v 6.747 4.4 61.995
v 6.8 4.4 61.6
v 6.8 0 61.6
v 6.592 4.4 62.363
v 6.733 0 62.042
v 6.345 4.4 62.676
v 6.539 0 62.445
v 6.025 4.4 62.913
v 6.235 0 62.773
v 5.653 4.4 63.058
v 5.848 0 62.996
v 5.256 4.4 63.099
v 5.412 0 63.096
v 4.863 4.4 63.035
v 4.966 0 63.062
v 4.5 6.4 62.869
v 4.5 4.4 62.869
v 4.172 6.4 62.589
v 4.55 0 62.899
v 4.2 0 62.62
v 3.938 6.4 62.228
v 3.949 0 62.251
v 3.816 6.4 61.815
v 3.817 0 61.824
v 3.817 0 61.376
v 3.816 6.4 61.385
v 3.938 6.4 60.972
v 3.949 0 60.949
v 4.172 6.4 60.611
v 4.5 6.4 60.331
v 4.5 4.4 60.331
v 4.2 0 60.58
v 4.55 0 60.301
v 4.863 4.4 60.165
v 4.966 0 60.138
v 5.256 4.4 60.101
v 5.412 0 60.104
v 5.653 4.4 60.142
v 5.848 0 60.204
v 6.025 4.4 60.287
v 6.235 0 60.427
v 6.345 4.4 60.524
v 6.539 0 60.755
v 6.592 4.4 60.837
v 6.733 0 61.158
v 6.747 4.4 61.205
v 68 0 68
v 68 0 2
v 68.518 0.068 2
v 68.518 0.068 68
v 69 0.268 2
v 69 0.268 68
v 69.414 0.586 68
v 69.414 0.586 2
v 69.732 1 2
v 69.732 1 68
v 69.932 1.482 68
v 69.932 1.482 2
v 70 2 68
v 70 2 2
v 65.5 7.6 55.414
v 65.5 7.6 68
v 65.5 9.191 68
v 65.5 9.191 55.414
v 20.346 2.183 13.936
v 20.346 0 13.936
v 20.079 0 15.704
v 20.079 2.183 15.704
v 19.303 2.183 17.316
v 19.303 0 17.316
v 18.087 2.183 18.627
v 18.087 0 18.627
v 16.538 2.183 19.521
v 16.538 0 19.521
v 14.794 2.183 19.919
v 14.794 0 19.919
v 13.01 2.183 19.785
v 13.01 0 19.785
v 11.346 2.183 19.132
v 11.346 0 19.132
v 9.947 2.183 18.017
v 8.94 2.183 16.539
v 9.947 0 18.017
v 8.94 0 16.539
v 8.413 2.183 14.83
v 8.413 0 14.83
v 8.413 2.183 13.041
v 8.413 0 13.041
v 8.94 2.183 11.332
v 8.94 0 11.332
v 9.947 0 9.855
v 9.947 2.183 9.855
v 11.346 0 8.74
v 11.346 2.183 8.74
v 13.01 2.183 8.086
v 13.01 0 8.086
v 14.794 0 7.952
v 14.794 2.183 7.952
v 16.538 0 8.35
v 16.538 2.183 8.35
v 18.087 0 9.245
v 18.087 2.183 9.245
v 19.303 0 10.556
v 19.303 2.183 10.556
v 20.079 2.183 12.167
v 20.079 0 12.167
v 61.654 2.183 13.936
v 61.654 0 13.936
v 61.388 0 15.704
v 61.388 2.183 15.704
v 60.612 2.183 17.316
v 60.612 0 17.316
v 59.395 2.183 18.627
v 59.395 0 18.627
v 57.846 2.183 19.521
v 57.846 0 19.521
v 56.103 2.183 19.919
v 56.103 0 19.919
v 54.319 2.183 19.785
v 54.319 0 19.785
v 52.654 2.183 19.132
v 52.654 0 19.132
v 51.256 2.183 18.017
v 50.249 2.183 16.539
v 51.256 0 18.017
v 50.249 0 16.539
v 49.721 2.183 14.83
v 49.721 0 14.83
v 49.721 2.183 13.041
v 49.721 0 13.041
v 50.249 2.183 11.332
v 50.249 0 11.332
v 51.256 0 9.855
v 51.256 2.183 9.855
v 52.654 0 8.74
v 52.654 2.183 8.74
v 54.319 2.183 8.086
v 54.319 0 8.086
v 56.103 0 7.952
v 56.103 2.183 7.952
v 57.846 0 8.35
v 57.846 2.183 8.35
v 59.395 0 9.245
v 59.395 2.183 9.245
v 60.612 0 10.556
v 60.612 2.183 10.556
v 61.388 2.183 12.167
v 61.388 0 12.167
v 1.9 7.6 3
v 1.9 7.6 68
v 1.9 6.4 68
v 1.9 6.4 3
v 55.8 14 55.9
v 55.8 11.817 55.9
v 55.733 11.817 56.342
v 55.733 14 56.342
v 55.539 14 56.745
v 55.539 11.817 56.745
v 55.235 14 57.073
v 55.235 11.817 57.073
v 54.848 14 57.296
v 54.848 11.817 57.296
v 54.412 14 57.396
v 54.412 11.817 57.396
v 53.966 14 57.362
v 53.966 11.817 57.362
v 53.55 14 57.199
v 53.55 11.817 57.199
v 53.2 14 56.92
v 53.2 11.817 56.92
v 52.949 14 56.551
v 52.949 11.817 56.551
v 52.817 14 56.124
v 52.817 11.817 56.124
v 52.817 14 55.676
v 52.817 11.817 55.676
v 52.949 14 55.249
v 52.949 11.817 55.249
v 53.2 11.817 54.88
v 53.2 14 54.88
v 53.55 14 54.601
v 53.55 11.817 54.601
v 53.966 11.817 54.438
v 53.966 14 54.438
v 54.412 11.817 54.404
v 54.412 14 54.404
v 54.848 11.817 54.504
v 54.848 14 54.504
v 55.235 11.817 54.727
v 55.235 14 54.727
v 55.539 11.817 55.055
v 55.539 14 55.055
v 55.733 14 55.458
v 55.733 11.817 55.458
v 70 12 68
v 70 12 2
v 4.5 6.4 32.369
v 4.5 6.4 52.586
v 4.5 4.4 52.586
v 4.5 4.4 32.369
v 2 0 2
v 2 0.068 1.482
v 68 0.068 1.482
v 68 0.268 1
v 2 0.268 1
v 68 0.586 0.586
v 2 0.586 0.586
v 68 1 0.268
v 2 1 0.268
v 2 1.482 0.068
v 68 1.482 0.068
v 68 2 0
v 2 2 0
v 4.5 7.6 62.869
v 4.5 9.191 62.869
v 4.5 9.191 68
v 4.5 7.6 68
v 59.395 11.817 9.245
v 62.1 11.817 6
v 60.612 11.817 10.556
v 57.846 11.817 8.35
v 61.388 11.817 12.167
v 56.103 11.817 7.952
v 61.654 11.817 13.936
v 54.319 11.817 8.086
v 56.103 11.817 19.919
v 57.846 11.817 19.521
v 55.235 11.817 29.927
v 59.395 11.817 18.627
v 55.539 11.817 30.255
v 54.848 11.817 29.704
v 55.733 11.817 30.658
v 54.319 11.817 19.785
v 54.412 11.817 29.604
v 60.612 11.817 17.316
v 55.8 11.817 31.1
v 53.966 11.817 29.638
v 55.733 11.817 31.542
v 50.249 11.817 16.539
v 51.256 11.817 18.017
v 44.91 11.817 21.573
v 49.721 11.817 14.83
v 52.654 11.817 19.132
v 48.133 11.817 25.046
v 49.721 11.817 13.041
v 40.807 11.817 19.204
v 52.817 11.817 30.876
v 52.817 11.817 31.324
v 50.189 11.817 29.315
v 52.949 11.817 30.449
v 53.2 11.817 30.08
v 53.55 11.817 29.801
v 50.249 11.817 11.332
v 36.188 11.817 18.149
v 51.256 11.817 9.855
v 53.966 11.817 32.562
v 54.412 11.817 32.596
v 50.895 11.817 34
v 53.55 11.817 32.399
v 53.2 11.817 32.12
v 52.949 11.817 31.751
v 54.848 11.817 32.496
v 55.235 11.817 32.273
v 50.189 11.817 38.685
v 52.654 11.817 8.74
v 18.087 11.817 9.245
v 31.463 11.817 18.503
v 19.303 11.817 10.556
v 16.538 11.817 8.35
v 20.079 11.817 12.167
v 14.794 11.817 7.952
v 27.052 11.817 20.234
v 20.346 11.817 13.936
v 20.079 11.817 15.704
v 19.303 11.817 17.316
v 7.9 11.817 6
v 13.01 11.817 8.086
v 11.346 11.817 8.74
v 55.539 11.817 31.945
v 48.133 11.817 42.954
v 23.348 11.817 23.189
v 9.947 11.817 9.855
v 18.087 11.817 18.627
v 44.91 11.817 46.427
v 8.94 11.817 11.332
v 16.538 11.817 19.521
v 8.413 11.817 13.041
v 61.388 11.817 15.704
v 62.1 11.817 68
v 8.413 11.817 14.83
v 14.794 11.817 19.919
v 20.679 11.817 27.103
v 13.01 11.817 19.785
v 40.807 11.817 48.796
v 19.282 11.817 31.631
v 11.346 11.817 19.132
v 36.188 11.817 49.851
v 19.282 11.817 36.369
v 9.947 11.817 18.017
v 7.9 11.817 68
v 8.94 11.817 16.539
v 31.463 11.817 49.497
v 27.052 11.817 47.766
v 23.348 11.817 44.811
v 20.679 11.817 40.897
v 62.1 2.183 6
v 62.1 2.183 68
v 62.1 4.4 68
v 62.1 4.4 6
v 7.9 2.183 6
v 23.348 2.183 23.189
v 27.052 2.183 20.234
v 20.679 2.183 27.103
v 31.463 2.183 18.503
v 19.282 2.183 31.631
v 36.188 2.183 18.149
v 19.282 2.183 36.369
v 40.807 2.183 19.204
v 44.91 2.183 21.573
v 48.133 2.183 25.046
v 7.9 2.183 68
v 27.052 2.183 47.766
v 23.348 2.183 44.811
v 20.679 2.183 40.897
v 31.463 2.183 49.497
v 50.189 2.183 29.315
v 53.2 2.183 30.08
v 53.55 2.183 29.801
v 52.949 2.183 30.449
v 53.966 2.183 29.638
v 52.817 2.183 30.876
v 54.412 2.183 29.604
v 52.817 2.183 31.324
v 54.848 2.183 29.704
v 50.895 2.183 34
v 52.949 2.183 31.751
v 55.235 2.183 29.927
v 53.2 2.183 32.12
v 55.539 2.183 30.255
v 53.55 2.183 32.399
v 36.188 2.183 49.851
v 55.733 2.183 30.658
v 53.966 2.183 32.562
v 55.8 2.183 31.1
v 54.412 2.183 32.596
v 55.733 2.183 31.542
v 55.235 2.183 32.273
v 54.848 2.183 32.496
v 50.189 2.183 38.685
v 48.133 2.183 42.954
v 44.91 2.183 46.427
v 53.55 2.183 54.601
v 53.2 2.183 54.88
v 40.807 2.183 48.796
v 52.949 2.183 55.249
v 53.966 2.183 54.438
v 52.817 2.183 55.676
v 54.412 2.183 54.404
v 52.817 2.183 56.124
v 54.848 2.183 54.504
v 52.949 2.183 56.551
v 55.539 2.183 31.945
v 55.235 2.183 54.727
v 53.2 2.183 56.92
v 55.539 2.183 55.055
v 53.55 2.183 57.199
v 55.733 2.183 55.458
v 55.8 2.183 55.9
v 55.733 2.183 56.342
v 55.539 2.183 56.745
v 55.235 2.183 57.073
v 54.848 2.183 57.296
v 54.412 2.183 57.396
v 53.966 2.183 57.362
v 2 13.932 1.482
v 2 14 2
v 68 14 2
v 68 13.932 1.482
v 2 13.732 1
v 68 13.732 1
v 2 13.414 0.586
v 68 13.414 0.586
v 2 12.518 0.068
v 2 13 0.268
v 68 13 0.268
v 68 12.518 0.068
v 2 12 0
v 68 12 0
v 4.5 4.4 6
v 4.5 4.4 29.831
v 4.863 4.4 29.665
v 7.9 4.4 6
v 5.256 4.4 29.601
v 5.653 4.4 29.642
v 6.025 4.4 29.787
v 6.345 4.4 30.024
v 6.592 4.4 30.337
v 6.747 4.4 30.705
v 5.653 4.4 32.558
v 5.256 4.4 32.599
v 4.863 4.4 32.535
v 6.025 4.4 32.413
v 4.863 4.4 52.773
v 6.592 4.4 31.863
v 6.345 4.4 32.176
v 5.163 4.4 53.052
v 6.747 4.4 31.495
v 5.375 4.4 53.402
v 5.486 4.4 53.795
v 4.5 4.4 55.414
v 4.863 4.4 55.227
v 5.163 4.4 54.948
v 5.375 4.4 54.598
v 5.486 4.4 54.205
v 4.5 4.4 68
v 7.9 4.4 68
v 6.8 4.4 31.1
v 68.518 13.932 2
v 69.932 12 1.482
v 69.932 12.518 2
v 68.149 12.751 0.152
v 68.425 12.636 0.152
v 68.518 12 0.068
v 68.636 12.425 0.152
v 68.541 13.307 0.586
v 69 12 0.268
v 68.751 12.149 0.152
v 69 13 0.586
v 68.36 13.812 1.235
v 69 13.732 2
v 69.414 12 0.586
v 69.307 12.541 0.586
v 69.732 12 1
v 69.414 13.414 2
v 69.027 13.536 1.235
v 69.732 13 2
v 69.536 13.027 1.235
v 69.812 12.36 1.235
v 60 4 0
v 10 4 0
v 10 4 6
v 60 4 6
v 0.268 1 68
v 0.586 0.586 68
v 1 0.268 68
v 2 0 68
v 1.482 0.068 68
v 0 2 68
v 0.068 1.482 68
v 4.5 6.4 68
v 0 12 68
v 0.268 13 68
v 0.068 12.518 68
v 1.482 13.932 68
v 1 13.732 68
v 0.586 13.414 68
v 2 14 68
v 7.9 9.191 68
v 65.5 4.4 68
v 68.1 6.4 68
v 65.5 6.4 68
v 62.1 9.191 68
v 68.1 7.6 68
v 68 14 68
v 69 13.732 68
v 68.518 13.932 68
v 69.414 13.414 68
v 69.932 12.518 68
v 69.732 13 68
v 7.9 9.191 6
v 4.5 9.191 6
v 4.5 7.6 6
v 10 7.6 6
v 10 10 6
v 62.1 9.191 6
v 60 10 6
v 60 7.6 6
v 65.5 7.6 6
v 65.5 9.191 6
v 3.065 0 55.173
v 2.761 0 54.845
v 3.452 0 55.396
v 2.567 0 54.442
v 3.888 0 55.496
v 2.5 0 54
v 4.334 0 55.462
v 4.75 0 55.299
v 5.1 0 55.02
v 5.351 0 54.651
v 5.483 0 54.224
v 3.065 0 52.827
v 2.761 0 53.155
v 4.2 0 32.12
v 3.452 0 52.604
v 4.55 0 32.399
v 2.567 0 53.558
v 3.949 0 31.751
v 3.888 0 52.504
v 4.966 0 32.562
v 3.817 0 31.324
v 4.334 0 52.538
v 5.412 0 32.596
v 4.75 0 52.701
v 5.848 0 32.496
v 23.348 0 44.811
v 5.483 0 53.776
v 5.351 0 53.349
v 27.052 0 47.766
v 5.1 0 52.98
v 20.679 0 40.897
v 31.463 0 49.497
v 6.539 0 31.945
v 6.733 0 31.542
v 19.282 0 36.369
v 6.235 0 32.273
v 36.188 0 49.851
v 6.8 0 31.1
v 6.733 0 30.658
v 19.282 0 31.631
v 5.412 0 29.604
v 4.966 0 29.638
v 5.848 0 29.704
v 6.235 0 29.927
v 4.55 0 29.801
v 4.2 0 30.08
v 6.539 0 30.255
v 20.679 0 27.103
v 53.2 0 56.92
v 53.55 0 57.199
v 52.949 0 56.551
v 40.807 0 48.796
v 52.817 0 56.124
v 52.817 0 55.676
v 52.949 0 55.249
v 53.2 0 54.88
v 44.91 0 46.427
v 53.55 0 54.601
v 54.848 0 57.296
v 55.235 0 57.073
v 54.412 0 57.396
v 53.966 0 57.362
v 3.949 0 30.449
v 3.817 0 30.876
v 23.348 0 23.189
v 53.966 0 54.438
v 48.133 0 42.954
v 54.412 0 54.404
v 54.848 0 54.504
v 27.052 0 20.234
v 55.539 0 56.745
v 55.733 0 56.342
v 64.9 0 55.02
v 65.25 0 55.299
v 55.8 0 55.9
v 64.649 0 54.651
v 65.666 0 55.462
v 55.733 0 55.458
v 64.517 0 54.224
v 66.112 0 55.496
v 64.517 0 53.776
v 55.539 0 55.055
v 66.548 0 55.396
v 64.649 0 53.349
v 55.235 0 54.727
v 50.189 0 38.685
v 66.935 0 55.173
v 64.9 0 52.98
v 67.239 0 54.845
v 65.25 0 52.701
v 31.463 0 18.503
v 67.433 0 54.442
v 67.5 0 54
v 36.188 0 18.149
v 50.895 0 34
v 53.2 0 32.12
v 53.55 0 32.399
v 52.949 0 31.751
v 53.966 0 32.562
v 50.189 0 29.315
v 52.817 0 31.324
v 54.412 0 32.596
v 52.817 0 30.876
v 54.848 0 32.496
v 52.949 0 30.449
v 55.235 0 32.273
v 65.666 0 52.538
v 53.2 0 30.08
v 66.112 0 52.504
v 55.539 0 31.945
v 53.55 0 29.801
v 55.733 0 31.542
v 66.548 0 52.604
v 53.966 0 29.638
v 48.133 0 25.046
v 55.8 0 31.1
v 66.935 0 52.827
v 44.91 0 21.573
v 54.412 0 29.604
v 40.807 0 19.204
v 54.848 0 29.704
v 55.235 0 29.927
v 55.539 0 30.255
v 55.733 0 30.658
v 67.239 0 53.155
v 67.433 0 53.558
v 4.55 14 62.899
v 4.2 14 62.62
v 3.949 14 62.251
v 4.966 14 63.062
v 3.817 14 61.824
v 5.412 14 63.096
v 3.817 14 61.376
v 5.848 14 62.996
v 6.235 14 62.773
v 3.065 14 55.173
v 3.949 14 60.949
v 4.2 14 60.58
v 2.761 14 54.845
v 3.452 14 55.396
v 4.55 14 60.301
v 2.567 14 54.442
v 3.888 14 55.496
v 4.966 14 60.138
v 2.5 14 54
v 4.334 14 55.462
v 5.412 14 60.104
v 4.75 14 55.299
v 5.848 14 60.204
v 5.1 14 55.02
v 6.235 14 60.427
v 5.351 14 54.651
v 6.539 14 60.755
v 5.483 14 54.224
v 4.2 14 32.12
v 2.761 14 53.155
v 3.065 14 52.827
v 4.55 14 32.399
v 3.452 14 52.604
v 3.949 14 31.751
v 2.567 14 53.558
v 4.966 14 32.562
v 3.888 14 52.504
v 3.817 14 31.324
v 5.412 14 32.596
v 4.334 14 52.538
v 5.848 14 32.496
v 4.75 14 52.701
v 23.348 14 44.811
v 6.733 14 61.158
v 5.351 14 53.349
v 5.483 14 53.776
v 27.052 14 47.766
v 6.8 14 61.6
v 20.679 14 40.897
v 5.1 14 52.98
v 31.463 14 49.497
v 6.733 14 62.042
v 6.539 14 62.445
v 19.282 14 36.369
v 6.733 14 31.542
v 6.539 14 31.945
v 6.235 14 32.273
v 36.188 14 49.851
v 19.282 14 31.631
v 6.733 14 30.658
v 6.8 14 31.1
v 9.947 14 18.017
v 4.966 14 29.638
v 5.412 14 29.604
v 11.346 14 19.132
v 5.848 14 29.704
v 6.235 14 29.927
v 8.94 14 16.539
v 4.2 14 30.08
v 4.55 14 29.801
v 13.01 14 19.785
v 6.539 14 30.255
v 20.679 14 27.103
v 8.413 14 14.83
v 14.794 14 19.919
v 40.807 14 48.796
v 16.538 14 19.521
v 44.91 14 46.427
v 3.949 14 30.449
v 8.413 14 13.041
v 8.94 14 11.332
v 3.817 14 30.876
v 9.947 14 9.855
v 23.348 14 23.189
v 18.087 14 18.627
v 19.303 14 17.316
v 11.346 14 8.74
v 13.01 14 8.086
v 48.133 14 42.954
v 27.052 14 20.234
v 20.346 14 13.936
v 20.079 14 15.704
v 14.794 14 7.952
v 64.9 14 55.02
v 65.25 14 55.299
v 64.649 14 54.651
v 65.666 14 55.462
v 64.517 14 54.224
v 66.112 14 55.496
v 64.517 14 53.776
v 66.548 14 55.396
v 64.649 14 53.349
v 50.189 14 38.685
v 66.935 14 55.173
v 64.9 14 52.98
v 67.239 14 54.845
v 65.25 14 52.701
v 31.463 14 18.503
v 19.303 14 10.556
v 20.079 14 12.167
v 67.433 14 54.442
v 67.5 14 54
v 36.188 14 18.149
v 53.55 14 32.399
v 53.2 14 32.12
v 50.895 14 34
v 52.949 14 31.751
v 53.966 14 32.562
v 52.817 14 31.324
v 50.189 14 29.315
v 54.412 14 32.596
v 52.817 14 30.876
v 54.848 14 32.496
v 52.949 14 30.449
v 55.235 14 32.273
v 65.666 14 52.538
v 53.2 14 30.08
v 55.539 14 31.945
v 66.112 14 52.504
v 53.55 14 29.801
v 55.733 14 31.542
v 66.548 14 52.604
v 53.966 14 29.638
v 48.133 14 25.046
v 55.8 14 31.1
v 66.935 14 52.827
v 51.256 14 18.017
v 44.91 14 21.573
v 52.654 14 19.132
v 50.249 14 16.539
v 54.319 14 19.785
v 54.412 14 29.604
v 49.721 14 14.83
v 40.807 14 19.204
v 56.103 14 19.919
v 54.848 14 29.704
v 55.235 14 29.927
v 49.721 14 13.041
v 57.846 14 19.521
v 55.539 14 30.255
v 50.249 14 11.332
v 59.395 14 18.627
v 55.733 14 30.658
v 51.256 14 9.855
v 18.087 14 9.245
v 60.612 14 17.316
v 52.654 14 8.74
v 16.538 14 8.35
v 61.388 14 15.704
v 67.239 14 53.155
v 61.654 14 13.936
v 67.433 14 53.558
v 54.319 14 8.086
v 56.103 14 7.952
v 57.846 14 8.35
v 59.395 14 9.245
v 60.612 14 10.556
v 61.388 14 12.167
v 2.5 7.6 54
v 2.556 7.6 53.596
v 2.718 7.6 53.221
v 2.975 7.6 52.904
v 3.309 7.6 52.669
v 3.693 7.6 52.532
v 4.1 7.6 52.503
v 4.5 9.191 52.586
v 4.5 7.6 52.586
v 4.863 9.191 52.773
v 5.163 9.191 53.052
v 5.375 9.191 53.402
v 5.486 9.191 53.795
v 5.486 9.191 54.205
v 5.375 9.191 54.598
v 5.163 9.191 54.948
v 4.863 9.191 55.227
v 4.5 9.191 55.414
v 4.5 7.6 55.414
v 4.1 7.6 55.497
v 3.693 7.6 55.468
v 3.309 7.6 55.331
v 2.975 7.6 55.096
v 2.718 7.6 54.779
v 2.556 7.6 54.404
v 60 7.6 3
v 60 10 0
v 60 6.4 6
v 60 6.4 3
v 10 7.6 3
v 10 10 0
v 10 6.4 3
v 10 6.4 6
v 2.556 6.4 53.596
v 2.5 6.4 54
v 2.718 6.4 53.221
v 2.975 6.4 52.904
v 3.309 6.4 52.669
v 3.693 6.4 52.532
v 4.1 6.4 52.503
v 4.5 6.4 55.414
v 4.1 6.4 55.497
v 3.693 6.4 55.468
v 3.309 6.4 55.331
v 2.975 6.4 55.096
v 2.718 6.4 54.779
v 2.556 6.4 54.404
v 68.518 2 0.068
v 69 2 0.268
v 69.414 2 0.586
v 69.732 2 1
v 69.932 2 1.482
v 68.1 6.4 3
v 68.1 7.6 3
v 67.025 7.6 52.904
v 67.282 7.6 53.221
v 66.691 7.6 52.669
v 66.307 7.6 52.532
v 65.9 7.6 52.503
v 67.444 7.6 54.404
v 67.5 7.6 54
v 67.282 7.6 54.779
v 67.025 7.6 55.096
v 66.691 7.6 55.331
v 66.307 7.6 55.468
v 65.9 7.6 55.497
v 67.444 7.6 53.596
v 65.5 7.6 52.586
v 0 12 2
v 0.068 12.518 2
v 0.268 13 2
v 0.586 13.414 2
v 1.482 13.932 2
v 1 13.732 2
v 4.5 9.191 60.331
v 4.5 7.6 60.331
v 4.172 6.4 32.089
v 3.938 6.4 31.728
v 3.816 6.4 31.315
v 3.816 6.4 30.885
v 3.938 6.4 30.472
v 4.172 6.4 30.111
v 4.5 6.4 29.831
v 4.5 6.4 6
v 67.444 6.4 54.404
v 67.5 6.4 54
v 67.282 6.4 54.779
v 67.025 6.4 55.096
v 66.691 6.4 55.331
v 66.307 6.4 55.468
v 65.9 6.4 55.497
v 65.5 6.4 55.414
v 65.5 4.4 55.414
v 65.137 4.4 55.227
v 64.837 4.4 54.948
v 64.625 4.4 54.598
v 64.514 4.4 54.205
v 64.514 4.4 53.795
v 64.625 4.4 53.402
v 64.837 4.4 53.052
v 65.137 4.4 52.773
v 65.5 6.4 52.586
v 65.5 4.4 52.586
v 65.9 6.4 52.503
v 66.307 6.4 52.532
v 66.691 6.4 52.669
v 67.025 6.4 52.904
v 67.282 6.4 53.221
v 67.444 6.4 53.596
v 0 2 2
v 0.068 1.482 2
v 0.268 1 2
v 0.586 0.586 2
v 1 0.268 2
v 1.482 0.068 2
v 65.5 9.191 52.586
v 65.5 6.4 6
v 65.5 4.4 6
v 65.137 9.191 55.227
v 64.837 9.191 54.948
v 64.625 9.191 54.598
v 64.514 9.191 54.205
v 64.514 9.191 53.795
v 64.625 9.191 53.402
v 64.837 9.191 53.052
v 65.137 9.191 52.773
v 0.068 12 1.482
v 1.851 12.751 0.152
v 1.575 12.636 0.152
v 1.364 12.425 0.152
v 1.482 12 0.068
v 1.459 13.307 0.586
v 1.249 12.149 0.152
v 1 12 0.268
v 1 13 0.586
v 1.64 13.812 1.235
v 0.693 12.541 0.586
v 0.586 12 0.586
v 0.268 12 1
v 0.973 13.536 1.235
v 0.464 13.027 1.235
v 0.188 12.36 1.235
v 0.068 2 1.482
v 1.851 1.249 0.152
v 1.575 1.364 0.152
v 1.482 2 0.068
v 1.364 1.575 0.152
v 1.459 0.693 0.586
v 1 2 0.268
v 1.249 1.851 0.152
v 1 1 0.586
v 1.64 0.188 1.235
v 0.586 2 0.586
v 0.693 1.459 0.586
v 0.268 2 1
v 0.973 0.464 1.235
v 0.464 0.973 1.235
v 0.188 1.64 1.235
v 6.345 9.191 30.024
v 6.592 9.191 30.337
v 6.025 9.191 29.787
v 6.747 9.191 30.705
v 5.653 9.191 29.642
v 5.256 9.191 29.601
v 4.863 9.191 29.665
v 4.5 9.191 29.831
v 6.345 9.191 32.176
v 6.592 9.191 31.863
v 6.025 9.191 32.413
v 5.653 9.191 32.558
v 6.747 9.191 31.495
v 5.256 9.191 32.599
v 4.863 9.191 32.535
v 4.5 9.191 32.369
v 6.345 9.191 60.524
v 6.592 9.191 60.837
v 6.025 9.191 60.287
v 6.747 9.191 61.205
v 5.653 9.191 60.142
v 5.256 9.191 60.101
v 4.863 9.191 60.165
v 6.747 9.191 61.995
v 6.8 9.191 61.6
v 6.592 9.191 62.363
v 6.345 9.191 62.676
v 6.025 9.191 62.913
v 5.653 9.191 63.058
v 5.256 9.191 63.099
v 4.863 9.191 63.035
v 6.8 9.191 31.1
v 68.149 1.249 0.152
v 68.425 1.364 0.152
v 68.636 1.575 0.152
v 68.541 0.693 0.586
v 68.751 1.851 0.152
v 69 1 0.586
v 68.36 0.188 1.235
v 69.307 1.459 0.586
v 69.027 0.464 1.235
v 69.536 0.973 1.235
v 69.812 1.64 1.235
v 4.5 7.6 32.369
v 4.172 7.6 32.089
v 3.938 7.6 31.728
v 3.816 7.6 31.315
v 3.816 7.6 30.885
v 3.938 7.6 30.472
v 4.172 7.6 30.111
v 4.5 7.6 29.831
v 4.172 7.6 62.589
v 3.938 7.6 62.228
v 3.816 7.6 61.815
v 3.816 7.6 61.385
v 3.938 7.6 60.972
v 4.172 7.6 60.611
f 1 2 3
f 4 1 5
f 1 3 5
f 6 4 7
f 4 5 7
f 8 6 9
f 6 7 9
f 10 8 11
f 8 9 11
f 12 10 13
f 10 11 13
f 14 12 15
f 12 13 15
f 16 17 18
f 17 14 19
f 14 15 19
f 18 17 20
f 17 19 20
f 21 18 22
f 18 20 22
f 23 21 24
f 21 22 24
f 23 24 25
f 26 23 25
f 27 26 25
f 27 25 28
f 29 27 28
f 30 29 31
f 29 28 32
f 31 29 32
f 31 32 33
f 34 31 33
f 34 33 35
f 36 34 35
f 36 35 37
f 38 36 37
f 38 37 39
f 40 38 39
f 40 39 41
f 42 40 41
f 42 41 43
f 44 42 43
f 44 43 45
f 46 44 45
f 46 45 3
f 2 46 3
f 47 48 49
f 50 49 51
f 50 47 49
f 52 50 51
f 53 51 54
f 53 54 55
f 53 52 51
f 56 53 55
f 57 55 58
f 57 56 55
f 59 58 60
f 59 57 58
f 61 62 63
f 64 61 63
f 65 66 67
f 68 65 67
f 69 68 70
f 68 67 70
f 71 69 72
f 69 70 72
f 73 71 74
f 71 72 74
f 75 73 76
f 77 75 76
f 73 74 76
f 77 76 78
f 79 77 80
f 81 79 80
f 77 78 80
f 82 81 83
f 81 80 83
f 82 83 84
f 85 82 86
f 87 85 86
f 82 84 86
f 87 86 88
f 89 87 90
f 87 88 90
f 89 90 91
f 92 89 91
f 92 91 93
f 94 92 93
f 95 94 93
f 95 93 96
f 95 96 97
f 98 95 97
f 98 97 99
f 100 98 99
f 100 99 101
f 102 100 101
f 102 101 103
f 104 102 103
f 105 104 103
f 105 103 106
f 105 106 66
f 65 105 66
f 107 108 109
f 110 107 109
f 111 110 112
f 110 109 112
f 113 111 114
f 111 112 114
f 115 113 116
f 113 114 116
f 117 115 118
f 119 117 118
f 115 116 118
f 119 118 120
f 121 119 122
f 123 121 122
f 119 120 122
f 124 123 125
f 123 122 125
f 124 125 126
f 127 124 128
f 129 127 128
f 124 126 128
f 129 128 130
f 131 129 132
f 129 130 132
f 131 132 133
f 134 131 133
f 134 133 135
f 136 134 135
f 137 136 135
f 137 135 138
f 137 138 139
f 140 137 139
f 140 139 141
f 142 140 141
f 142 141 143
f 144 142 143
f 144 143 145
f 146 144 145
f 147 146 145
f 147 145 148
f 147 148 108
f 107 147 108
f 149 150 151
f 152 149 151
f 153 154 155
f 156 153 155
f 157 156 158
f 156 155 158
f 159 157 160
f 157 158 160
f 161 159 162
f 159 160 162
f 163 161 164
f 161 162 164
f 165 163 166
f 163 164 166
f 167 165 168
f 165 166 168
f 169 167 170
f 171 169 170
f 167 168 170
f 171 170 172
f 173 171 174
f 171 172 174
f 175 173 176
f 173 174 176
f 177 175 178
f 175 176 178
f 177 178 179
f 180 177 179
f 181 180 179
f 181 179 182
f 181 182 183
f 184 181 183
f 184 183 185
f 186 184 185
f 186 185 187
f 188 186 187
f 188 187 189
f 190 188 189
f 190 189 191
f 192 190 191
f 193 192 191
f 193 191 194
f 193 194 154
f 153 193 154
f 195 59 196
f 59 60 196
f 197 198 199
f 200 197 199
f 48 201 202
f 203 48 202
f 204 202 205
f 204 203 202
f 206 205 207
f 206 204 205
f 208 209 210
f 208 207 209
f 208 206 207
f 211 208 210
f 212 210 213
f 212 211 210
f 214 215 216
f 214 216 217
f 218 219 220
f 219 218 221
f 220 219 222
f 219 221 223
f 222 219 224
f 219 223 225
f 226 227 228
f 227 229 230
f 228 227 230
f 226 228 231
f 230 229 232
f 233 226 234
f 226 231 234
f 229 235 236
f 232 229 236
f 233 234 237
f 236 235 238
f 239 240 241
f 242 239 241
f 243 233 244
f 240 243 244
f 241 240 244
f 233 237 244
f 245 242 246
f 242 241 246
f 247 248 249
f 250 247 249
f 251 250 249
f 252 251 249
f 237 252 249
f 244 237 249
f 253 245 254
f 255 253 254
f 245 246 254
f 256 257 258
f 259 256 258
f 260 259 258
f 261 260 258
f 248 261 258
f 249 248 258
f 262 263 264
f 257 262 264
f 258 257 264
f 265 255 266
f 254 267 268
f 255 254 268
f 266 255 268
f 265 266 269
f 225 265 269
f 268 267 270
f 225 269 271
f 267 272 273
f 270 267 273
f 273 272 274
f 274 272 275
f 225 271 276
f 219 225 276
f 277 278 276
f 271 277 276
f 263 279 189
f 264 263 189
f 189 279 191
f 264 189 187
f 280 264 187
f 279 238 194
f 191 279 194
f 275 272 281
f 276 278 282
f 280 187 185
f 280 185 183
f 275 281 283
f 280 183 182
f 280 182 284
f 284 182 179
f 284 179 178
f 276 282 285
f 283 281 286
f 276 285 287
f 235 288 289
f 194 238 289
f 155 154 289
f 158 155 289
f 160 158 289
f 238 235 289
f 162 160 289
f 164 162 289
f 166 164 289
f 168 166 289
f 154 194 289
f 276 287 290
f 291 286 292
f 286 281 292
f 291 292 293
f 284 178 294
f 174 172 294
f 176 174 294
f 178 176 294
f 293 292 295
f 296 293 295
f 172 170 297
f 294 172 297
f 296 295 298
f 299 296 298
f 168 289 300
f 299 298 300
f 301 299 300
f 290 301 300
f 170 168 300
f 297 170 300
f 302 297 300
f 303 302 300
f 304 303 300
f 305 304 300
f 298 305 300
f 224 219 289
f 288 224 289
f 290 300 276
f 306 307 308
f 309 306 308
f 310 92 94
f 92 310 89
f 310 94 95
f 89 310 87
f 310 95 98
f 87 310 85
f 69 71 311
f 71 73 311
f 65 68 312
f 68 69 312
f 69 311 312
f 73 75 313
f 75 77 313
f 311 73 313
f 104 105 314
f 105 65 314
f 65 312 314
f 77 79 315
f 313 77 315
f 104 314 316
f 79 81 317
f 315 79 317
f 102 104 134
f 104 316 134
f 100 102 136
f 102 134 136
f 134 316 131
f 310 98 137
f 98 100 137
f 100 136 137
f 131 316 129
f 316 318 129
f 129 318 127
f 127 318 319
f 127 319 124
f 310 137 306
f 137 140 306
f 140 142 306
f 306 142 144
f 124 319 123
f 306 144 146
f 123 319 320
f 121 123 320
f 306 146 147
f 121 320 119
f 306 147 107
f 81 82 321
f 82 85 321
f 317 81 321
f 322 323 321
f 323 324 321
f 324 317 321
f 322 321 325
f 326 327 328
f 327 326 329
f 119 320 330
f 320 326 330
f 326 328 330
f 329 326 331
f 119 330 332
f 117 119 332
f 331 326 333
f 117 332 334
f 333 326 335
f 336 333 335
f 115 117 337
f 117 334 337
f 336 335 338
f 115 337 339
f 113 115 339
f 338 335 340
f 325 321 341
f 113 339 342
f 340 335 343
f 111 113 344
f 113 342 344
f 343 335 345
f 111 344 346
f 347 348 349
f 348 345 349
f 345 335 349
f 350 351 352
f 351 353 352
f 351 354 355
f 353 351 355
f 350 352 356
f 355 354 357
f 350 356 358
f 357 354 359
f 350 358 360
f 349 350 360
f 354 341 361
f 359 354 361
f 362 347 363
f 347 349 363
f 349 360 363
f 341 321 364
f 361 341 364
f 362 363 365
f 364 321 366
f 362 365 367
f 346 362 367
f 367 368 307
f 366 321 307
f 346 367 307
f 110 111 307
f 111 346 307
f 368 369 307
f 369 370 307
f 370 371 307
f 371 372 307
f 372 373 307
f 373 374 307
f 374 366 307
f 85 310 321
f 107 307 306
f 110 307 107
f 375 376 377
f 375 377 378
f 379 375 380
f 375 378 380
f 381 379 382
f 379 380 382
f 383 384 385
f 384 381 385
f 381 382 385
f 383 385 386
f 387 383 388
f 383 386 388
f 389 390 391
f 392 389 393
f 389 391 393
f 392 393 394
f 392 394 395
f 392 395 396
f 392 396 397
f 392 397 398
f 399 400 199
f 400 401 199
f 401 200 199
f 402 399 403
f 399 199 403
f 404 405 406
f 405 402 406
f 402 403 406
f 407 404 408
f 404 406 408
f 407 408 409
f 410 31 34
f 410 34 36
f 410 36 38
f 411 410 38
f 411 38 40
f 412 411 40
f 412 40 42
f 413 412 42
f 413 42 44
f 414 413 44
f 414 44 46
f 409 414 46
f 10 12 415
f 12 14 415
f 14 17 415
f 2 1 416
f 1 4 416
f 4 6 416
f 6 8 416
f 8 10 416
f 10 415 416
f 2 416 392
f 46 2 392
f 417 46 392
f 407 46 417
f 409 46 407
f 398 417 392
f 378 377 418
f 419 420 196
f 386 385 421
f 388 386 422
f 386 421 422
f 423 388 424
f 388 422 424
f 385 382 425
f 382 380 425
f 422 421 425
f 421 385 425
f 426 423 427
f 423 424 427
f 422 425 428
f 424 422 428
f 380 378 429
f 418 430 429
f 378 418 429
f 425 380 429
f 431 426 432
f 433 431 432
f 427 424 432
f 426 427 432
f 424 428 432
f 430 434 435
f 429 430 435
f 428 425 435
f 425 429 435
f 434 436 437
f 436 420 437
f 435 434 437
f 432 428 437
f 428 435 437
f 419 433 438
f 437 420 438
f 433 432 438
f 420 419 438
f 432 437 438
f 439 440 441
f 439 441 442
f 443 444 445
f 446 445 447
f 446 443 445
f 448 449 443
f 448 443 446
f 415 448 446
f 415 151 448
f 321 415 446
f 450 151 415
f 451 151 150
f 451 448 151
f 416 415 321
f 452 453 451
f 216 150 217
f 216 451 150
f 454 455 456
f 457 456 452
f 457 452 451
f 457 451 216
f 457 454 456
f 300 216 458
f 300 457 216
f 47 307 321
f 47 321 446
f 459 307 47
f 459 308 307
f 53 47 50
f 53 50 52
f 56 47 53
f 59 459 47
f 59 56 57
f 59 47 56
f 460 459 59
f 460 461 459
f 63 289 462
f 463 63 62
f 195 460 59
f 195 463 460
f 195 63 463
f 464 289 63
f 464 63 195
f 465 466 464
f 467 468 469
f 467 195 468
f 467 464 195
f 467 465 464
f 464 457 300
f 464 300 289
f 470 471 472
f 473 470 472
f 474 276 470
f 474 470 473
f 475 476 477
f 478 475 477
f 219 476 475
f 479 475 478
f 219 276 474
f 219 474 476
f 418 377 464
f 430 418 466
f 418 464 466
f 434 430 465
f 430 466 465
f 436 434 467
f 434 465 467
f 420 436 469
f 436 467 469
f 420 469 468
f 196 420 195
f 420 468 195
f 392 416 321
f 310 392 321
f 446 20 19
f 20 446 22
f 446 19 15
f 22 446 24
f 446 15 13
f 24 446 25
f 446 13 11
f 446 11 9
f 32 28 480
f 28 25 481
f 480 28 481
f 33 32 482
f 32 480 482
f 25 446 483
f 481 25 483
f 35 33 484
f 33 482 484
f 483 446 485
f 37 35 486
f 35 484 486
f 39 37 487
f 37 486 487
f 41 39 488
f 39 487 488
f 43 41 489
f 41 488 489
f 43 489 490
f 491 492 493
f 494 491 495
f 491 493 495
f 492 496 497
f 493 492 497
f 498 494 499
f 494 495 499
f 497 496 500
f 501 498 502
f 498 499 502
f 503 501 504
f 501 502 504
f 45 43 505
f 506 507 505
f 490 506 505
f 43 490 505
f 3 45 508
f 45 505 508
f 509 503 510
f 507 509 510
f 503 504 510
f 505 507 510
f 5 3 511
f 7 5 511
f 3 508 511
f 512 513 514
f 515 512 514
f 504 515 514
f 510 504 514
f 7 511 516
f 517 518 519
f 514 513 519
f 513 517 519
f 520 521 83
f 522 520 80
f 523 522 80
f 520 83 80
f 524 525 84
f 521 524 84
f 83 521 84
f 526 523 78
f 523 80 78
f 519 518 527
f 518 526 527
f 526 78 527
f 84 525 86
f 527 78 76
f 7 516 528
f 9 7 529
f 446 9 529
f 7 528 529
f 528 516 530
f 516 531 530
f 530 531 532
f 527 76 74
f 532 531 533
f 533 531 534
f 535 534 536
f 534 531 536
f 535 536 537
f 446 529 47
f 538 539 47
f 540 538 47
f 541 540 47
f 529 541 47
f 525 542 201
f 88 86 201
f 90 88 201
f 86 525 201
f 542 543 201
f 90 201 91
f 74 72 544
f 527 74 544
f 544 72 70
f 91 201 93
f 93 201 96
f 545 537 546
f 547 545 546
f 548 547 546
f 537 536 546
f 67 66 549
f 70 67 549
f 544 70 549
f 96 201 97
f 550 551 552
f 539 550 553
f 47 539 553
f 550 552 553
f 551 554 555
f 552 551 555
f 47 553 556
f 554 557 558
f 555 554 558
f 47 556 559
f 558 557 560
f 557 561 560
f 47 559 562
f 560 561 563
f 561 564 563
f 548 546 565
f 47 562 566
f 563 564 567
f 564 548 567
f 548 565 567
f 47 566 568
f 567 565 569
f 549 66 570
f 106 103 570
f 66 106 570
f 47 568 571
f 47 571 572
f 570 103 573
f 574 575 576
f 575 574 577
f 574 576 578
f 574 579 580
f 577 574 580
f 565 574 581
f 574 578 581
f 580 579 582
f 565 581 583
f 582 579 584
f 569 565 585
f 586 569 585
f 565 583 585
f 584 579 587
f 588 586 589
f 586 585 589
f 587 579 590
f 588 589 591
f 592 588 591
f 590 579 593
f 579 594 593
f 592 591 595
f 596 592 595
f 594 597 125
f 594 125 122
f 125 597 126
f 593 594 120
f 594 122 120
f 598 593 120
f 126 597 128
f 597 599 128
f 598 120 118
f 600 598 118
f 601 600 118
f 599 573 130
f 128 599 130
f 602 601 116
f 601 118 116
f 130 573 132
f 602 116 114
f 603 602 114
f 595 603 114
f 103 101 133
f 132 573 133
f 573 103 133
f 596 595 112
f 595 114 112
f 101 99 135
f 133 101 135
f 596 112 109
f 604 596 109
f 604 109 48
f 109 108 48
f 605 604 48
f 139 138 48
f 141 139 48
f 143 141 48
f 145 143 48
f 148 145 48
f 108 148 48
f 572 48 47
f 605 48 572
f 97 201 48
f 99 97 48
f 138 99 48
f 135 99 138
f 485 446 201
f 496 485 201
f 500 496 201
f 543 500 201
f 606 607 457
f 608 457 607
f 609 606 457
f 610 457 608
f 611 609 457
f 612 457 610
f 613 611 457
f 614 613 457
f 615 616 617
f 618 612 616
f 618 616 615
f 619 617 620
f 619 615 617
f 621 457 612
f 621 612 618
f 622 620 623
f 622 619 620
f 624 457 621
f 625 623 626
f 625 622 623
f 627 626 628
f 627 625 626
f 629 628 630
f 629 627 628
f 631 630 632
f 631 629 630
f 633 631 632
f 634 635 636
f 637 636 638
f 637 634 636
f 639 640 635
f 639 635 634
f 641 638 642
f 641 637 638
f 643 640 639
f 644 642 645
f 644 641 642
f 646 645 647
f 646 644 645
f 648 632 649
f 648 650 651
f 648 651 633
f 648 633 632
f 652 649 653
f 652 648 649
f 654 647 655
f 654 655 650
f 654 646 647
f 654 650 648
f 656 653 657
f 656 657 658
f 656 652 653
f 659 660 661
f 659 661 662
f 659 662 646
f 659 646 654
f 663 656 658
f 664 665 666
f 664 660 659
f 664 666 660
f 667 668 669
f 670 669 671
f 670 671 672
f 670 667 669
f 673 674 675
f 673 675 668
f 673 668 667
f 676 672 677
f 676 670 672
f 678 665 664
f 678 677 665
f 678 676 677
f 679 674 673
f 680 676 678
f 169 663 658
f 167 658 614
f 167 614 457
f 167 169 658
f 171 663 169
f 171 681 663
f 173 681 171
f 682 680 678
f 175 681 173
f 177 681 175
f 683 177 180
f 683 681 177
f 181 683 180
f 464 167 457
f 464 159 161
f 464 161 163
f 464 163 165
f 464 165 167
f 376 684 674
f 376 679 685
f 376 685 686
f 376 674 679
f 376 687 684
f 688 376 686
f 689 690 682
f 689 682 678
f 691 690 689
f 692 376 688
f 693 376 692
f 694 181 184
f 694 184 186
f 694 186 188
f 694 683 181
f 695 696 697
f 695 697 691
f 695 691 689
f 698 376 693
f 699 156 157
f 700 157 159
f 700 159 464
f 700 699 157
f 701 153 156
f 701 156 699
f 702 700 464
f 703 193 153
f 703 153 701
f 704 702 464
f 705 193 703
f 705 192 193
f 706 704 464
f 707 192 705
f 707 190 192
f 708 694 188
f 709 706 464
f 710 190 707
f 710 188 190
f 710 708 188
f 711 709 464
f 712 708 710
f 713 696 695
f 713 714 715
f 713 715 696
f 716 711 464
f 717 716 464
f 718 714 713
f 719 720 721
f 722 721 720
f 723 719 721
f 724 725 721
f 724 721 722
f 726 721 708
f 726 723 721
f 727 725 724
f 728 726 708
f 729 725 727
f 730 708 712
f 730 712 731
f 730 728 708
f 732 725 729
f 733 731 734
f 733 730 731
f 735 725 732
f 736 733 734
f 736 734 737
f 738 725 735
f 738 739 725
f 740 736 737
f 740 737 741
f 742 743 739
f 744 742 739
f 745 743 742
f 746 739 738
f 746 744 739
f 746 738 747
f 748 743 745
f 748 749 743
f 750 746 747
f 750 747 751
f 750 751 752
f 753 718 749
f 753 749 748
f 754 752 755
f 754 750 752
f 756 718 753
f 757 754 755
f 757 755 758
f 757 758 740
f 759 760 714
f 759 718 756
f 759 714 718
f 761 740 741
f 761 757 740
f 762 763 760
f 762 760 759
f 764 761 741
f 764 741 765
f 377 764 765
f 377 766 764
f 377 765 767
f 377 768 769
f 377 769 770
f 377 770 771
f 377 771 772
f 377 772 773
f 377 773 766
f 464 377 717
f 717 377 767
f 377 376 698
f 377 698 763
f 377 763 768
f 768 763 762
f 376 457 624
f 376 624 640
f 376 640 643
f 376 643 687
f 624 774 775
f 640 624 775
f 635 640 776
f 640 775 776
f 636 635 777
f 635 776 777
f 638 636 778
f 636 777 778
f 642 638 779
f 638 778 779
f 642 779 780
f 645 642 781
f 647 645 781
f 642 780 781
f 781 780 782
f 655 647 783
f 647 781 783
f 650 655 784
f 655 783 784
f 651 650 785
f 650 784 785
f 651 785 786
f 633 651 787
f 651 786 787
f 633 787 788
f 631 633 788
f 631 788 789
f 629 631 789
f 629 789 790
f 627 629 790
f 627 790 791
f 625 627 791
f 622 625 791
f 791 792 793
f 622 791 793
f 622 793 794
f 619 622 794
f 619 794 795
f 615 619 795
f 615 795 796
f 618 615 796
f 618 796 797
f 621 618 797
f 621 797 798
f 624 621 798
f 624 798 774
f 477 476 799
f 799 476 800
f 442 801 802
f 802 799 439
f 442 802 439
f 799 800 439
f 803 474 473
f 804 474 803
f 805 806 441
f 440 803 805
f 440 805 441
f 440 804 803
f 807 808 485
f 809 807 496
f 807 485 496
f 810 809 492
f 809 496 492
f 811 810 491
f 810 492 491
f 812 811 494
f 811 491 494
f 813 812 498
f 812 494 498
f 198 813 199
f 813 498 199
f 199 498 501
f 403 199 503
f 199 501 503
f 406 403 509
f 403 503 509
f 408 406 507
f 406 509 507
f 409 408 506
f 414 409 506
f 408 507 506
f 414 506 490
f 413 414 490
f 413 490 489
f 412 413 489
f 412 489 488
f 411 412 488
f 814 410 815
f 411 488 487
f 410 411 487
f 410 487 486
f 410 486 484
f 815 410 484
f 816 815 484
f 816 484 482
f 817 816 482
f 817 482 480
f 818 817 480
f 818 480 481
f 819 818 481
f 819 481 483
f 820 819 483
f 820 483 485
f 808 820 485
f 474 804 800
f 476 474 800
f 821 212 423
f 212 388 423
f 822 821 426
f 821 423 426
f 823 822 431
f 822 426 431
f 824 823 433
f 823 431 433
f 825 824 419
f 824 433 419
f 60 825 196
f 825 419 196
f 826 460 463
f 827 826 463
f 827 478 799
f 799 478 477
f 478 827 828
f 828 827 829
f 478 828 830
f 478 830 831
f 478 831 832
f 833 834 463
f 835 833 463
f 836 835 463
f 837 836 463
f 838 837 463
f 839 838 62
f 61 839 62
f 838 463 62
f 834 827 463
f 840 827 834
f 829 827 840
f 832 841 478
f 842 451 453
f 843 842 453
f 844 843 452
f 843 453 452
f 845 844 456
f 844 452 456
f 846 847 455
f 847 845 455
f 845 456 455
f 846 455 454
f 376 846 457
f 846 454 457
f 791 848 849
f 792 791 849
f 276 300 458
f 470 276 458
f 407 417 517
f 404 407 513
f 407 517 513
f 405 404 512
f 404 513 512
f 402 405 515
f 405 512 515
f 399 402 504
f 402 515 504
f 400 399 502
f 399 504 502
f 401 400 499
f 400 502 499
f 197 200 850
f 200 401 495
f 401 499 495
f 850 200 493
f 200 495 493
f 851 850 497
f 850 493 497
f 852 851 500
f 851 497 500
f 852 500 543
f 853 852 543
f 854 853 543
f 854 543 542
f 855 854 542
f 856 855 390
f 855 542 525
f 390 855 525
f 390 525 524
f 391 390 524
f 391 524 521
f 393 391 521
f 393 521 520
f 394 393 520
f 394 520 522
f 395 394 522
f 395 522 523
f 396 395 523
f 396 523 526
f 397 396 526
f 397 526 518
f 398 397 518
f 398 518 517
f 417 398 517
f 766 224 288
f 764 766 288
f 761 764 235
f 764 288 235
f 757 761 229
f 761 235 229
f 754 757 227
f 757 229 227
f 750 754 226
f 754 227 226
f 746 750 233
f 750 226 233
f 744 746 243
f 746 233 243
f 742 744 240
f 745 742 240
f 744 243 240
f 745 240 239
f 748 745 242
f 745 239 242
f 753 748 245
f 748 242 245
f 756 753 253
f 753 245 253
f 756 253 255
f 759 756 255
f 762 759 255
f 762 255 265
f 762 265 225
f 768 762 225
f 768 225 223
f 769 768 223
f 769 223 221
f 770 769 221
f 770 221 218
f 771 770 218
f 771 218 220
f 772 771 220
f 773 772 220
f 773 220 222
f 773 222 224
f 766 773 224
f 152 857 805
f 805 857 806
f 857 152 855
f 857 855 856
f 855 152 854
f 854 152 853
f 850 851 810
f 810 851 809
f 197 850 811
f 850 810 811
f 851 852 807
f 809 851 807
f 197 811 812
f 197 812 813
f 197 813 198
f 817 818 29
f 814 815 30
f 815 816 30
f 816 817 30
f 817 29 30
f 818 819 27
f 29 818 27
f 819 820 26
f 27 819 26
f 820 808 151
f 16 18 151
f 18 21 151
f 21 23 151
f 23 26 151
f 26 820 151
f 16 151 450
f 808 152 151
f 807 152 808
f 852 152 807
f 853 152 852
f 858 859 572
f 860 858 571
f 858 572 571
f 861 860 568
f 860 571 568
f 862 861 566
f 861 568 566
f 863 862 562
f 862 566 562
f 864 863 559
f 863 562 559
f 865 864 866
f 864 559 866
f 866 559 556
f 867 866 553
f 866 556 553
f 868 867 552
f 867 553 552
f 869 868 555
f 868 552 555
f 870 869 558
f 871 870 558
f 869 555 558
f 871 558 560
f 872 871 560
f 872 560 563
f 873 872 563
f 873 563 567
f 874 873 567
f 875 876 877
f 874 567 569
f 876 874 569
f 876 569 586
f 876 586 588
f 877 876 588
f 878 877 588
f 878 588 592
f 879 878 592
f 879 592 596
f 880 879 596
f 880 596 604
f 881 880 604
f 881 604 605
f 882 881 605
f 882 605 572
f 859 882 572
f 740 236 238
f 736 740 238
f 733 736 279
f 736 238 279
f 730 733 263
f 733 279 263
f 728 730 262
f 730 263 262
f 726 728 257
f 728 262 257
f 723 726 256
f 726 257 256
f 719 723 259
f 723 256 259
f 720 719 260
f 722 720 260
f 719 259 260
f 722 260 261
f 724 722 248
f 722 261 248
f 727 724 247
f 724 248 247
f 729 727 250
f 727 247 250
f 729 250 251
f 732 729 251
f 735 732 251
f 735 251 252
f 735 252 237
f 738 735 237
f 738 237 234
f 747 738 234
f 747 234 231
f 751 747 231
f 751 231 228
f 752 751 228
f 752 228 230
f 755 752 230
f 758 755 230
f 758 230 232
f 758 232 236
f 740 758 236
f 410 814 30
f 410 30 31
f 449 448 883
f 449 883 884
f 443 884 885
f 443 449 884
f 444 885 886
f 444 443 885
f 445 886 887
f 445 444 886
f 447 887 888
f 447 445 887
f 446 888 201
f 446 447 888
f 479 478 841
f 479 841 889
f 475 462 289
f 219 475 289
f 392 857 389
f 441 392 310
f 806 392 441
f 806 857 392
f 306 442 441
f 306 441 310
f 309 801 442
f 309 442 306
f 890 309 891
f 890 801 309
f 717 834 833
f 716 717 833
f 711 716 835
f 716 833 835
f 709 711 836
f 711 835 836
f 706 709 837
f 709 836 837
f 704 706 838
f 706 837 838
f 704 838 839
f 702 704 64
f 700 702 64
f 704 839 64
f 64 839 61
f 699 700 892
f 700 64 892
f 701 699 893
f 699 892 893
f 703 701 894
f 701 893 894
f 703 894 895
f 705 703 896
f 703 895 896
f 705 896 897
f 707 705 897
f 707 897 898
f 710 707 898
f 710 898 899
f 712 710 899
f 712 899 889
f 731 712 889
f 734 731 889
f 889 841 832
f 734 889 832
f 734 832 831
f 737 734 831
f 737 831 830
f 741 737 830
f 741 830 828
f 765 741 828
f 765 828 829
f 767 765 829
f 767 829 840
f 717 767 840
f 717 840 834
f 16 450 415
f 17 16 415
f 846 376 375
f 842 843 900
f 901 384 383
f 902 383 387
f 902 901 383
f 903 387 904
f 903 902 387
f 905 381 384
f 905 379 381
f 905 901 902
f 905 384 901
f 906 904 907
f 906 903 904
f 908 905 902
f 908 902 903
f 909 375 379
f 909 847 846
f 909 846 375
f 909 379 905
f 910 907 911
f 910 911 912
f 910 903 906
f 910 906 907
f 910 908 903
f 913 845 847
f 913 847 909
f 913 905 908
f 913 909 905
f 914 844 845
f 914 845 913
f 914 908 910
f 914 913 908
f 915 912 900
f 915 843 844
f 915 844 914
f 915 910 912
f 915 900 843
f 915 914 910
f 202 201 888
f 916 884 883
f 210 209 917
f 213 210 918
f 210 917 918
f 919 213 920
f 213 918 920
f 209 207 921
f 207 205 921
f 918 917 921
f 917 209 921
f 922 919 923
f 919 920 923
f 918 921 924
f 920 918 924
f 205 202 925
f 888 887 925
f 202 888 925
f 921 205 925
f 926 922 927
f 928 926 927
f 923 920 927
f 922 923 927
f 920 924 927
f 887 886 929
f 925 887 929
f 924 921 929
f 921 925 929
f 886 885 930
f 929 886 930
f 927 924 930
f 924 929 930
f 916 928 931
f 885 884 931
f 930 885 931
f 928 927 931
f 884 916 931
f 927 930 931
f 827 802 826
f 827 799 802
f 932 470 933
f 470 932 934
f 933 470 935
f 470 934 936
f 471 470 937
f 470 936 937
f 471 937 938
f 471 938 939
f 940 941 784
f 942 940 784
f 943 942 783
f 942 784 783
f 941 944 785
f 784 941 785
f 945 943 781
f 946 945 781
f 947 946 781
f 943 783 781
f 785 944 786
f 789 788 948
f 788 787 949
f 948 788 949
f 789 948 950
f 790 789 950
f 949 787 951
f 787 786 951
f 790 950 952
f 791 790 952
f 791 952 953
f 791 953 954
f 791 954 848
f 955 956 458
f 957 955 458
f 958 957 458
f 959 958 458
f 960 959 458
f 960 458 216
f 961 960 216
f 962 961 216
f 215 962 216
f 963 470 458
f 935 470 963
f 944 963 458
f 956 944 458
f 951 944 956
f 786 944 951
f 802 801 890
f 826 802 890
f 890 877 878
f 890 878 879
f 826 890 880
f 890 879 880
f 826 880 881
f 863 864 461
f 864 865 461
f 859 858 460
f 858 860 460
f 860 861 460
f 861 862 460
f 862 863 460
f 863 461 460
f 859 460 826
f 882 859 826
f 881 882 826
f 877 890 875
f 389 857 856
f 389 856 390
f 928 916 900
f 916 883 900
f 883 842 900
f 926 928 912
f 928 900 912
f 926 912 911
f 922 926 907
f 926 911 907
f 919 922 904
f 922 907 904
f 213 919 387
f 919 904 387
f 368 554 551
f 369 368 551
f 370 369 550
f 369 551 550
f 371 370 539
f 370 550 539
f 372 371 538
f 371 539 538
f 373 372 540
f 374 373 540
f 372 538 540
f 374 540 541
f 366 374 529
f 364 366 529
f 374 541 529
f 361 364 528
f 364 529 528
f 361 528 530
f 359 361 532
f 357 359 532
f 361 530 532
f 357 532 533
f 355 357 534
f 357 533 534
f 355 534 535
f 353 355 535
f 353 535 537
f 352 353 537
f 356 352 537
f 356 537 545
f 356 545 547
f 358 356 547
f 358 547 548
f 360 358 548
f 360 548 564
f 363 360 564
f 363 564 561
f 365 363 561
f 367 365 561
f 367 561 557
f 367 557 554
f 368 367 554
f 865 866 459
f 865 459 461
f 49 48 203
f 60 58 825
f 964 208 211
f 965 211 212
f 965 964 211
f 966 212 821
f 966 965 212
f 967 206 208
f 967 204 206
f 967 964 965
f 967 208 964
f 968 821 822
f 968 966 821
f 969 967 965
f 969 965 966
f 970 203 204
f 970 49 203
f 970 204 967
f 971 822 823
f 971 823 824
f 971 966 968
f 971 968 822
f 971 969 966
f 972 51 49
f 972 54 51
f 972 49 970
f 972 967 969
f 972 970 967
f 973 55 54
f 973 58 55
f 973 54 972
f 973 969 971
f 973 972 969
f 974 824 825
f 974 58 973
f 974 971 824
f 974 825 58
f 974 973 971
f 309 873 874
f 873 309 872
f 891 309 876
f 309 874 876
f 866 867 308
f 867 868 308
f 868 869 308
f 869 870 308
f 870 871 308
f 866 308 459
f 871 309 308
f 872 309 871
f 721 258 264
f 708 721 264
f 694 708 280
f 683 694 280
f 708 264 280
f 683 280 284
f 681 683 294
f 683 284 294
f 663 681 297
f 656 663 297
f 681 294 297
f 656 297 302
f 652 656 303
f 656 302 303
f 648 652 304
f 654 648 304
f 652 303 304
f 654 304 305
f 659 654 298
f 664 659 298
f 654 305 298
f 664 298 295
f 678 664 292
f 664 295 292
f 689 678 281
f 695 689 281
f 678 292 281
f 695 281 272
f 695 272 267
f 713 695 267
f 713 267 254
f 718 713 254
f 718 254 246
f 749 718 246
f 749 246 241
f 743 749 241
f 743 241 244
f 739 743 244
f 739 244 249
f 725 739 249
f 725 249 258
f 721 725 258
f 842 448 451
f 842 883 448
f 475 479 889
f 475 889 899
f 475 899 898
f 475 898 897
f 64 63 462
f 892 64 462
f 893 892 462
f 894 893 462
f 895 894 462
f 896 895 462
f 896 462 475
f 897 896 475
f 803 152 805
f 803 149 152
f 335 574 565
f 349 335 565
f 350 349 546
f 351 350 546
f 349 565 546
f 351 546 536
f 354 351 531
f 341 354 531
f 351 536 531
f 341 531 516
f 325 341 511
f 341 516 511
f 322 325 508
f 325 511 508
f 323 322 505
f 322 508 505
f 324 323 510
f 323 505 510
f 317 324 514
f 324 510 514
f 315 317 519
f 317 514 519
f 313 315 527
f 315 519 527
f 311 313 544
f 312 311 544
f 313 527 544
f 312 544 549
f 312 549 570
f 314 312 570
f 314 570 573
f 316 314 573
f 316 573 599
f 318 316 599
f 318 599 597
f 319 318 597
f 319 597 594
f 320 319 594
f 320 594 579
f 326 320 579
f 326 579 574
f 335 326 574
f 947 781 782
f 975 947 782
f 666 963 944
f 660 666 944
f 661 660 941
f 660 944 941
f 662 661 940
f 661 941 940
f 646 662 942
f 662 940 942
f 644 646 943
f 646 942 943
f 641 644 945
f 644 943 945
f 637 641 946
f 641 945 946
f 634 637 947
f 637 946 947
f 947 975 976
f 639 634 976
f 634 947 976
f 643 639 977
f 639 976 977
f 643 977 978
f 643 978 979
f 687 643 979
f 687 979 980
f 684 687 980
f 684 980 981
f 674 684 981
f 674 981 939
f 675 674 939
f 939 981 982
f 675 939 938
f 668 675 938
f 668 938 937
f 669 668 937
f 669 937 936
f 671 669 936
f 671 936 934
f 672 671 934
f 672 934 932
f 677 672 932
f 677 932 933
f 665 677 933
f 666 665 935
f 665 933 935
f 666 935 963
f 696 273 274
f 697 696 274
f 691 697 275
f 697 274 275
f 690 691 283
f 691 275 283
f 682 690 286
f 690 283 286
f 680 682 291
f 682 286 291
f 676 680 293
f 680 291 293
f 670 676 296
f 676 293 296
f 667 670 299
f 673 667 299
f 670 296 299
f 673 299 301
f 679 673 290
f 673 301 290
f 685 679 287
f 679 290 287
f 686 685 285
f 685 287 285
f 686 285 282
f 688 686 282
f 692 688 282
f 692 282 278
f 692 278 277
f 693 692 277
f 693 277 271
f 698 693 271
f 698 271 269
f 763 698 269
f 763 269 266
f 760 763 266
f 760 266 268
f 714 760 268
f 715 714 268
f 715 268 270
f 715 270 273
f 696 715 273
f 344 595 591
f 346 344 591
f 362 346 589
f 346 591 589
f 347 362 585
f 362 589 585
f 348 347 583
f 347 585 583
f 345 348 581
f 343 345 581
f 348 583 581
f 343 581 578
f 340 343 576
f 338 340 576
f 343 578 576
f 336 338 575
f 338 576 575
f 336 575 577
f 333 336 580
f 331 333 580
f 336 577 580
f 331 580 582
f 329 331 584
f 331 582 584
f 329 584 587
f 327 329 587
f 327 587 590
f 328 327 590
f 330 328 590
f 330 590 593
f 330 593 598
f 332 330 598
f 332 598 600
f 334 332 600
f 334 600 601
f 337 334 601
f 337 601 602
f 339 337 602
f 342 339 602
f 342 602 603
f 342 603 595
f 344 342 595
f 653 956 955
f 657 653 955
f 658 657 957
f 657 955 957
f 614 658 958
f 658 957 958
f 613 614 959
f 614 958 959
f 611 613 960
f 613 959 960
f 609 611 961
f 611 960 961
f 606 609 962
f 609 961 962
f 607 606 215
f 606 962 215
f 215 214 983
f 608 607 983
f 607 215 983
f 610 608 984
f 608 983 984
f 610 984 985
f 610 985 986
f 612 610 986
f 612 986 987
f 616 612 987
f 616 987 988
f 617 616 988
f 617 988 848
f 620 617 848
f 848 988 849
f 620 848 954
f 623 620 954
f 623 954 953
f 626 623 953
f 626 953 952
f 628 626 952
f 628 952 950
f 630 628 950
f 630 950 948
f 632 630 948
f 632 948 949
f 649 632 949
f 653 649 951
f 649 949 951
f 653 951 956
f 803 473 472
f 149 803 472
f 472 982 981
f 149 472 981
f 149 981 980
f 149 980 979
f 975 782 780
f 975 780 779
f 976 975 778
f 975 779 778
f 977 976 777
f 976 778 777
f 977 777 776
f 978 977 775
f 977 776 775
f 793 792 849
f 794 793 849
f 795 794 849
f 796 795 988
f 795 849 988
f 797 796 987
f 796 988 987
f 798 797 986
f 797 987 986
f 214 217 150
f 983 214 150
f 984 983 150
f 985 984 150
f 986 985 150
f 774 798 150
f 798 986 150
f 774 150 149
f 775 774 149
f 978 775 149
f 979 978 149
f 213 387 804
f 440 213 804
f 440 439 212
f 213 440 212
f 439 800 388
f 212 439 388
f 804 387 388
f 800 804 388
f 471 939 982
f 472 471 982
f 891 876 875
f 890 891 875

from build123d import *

# Parameters (mm, degrees)
F0_W     = 70
F0_H     = 14
F1_DEPTH = 68
F3_R     = 1.5
F3_R_2   = 15.895113
F3_R_3   = 6
F4_DEPTH = 14
F5_DEPTH = 65
F6_DEPTH = 62
F7_R     = 2
F8_W     = 50
F8_H     = 6
F9_DEPTH = 10


with BuildPart() as f1:
    # F0 (on Top) → F1 (new body)
    with BuildSketch(Plane.XY):
        with Locations((35, 7)):
            Rectangle(F0_W, F0_H)
    extrude(amount=F1_DEPTH)

    # F3 (on face) → F4 (cut)
    with BuildSketch(Plane.XZ):
        with Locations((5.3, 61.6)):
            Circle(F3_R)
        with BuildLine():
            ThreePointArc((5.5, 54), (4, 55.5), (2.5, 54))
            ThreePointArc((2.5, 54), (4, 52.5), (5.5, 54))
        make_face()
        with Locations((5.3, 31.1)):
            Circle(F3_R)
        with Locations((54.3, 31.1)):
            Circle(F3_R)
        with Locations((54.3, 55.9)):
            Circle(F3_R)
        with Locations((66, 54)):
            Circle(F3_R)
        with Locations((35, 34)):
            Circle(F3_R_2)
        with Locations((14.345588, 13.935714)):
            Circle(F3_R_3)
        with Locations((55.654412, 13.935714)):
            Circle(F3_R_3)
    extrude(amount=-F4_DEPTH, mode=Mode.SUBTRACT)

    # F2 (on face) → F5 (cut)
    with BuildSketch(Plane.XY.offset(68)):
        Polygon((65.5, 6.4), (68.1, 6.4), (68.1, 7.6), (65.5, 7.6), (4.5, 7.6), (1.9, 7.6), (1.9, 6.4), (4.5, 6.4), align=None)
    extrude(amount=-F5_DEPTH, mode=Mode.SUBTRACT)

    # F2 (on face) → F6 (cut)
    with BuildSketch(Plane.XY.offset(68)):
        Polygon((4.5, 7.6), (65.5, 7.6), (65.5, 9.190958), (62.1, 9.190958), (62.1, 11.817135), (7.9, 11.817135), (7.9, 9.190958), (4.5, 9.190958), align=None)
        Polygon((65.5, 4.4), (65.5, 6.4), (4.5, 6.4), (4.5, 4.4), (7.9, 4.4), (7.9, 2.182865), (62.1, 2.182865), (62.1, 4.4), align=None)
    extrude(amount=-F6_DEPTH, mode=Mode.SUBTRACT)

    # F7
    f7_edges = [f1.edges().sort_by_distance(p)[0] for p in [
        (0, 0, 34),
        (0, 14, 34),
        (70, 0, 34),
        (70, 14, 34),
        (35, 0, 0),
        (35, 14, 0),
        (0, 7, 0),
        (70, 7, 0),
    ]]
    fillet(f7_edges, radius=F7_R)

    # F8 (on face) → F9 (cut)
    with BuildSketch(Plane(origin=(0, 0, 0), x_dir=(1, 0, 0), z_dir=(0, 0, -1))):
        with Locations((35, -7)):
            Rectangle(F8_W, F8_H)
    extrude(amount=-F9_DEPTH, mode=Mode.SUBTRACT)


solid = f1.part
